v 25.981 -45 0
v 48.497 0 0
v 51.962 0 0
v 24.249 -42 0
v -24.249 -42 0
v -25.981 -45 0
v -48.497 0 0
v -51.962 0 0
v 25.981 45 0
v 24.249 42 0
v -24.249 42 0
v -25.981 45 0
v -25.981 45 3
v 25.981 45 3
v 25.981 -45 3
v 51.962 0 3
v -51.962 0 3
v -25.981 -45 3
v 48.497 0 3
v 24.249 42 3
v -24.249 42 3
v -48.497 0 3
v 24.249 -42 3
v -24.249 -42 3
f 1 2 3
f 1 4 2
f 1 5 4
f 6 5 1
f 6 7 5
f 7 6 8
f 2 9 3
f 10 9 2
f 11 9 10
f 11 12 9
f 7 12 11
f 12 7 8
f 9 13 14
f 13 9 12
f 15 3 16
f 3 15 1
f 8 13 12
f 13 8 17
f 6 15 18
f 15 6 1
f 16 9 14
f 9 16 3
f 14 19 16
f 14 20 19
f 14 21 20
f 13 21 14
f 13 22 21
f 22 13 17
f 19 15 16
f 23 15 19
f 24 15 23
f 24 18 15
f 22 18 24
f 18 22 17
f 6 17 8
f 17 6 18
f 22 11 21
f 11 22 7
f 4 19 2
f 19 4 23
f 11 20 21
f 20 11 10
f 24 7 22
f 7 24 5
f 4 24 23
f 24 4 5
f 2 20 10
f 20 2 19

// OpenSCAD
// Float for 7 x 15 mL conical tubes, printed upside down (plate on bed, z=0..3)
// All dimensions in mm, taken from the spec.

$fn = 64;

// --- Plate (regular hexagon, 90 mm across flats, 2 flats parallel to X) ---
plate_af   = 90;   // across flats
plate_t    = 3;    // plate thickness (z 0..3)
plate_ap   = plate_af / cos(30); // across corners = 103.923
plate_r    = plate_ap / 2;       // circumradius of hexagon

// --- Holes & sleeves ---
hole_d     = 17.5;  // through-hole diameter
hole_r     = hole_d / 2;
sleeve_od  = 21.5;  // sleeve outside diameter (2 mm wall)
sleeve_r   = sleeve_od / 2;
sleeve_h   = 20;    // sleeve top height (z = 20)
ring_d     = 54;    // diameter of the 6-hole circle
ring_r     = ring_d / 2;

// --- Hexagonal skirt (2 mm wall, 84 mm across flats outside, 3 mm in from plate edge) ---
skirt_af   = 84;    // across flats outside
skirt_t    = 2;     // wall thickness
skirt_af_i = skirt_af - 2 * skirt_t; // across flats inside = 80
skirt_ap   = skirt_af / cos(30);     // across corners outside
skirt_ap_i = skirt_af_i / cos(30);   // across corners inside
skirt_h    = 20;    // skirt top height (z = 20)

// --- Helper: regular hexagon with 2 flats parallel to X (flat-top) ---
module hexagon(af) {
    r = af / cos(30) / 2;
    polygon([
        [ r, 0 ],
        [ r/2,  r*sin(60) ],
        [ -r/2,  r*sin(60) ],
        [ -r, 0 ],
        [ -r/2, -r*sin(60) ],
        [  r/2, -r*sin(60) ]
    ]);
}

// --- Hole positions: 1 at centre + 6 on 54 mm circle, first on +X, 60 deg apart ---
hole_pos = [
    [0, 0],
    [ ring_r, 0 ],
    [ ring_r*cos(60),  ring_r*sin(60) ],
    [ -ring_r*cos(60),  ring_r*sin(60) ],
    [ -ring_r, 0 ],
    [ -ring_r*cos(60), -ring_r*sin(60) ],
    [  ring_r*cos(60), -ring_r*sin(60) ]
];

// --- Build the float (print orientation: plate on bed, features up +Z) ---
difference() {
    // Solid plate
    linear_extrude(plate_t) hexagon(plate_af);

    // Solid sleeves (full cylinders, z 0..20)
    for (p = hole_pos)
        translate([p[0], p[1], 0])
            cylinder(h = sleeve_h, r = sleeve_r, $fn = $fn);

    // Solid skirt (full hexagon, z 0..20)
    linear_extrude(skirt_h) hexagon(skirt_af);

    // Cut: 7 through-holes (extend 1 mm past both faces)
    for (p = hole_pos)
        translate([p[0], p[1], -1])
            cylinder(h = sleeve_h + 2, r = hole_r, $fn = $fn);

    // Cut: skirt cavity (hollows the skirt to a 2 mm wall; extends 1 mm past both faces)
    linear_extrude(skirt_h + 2, center = false)
        translate([0, 0, -1])
            hexagon(skirt_af_i);
}
